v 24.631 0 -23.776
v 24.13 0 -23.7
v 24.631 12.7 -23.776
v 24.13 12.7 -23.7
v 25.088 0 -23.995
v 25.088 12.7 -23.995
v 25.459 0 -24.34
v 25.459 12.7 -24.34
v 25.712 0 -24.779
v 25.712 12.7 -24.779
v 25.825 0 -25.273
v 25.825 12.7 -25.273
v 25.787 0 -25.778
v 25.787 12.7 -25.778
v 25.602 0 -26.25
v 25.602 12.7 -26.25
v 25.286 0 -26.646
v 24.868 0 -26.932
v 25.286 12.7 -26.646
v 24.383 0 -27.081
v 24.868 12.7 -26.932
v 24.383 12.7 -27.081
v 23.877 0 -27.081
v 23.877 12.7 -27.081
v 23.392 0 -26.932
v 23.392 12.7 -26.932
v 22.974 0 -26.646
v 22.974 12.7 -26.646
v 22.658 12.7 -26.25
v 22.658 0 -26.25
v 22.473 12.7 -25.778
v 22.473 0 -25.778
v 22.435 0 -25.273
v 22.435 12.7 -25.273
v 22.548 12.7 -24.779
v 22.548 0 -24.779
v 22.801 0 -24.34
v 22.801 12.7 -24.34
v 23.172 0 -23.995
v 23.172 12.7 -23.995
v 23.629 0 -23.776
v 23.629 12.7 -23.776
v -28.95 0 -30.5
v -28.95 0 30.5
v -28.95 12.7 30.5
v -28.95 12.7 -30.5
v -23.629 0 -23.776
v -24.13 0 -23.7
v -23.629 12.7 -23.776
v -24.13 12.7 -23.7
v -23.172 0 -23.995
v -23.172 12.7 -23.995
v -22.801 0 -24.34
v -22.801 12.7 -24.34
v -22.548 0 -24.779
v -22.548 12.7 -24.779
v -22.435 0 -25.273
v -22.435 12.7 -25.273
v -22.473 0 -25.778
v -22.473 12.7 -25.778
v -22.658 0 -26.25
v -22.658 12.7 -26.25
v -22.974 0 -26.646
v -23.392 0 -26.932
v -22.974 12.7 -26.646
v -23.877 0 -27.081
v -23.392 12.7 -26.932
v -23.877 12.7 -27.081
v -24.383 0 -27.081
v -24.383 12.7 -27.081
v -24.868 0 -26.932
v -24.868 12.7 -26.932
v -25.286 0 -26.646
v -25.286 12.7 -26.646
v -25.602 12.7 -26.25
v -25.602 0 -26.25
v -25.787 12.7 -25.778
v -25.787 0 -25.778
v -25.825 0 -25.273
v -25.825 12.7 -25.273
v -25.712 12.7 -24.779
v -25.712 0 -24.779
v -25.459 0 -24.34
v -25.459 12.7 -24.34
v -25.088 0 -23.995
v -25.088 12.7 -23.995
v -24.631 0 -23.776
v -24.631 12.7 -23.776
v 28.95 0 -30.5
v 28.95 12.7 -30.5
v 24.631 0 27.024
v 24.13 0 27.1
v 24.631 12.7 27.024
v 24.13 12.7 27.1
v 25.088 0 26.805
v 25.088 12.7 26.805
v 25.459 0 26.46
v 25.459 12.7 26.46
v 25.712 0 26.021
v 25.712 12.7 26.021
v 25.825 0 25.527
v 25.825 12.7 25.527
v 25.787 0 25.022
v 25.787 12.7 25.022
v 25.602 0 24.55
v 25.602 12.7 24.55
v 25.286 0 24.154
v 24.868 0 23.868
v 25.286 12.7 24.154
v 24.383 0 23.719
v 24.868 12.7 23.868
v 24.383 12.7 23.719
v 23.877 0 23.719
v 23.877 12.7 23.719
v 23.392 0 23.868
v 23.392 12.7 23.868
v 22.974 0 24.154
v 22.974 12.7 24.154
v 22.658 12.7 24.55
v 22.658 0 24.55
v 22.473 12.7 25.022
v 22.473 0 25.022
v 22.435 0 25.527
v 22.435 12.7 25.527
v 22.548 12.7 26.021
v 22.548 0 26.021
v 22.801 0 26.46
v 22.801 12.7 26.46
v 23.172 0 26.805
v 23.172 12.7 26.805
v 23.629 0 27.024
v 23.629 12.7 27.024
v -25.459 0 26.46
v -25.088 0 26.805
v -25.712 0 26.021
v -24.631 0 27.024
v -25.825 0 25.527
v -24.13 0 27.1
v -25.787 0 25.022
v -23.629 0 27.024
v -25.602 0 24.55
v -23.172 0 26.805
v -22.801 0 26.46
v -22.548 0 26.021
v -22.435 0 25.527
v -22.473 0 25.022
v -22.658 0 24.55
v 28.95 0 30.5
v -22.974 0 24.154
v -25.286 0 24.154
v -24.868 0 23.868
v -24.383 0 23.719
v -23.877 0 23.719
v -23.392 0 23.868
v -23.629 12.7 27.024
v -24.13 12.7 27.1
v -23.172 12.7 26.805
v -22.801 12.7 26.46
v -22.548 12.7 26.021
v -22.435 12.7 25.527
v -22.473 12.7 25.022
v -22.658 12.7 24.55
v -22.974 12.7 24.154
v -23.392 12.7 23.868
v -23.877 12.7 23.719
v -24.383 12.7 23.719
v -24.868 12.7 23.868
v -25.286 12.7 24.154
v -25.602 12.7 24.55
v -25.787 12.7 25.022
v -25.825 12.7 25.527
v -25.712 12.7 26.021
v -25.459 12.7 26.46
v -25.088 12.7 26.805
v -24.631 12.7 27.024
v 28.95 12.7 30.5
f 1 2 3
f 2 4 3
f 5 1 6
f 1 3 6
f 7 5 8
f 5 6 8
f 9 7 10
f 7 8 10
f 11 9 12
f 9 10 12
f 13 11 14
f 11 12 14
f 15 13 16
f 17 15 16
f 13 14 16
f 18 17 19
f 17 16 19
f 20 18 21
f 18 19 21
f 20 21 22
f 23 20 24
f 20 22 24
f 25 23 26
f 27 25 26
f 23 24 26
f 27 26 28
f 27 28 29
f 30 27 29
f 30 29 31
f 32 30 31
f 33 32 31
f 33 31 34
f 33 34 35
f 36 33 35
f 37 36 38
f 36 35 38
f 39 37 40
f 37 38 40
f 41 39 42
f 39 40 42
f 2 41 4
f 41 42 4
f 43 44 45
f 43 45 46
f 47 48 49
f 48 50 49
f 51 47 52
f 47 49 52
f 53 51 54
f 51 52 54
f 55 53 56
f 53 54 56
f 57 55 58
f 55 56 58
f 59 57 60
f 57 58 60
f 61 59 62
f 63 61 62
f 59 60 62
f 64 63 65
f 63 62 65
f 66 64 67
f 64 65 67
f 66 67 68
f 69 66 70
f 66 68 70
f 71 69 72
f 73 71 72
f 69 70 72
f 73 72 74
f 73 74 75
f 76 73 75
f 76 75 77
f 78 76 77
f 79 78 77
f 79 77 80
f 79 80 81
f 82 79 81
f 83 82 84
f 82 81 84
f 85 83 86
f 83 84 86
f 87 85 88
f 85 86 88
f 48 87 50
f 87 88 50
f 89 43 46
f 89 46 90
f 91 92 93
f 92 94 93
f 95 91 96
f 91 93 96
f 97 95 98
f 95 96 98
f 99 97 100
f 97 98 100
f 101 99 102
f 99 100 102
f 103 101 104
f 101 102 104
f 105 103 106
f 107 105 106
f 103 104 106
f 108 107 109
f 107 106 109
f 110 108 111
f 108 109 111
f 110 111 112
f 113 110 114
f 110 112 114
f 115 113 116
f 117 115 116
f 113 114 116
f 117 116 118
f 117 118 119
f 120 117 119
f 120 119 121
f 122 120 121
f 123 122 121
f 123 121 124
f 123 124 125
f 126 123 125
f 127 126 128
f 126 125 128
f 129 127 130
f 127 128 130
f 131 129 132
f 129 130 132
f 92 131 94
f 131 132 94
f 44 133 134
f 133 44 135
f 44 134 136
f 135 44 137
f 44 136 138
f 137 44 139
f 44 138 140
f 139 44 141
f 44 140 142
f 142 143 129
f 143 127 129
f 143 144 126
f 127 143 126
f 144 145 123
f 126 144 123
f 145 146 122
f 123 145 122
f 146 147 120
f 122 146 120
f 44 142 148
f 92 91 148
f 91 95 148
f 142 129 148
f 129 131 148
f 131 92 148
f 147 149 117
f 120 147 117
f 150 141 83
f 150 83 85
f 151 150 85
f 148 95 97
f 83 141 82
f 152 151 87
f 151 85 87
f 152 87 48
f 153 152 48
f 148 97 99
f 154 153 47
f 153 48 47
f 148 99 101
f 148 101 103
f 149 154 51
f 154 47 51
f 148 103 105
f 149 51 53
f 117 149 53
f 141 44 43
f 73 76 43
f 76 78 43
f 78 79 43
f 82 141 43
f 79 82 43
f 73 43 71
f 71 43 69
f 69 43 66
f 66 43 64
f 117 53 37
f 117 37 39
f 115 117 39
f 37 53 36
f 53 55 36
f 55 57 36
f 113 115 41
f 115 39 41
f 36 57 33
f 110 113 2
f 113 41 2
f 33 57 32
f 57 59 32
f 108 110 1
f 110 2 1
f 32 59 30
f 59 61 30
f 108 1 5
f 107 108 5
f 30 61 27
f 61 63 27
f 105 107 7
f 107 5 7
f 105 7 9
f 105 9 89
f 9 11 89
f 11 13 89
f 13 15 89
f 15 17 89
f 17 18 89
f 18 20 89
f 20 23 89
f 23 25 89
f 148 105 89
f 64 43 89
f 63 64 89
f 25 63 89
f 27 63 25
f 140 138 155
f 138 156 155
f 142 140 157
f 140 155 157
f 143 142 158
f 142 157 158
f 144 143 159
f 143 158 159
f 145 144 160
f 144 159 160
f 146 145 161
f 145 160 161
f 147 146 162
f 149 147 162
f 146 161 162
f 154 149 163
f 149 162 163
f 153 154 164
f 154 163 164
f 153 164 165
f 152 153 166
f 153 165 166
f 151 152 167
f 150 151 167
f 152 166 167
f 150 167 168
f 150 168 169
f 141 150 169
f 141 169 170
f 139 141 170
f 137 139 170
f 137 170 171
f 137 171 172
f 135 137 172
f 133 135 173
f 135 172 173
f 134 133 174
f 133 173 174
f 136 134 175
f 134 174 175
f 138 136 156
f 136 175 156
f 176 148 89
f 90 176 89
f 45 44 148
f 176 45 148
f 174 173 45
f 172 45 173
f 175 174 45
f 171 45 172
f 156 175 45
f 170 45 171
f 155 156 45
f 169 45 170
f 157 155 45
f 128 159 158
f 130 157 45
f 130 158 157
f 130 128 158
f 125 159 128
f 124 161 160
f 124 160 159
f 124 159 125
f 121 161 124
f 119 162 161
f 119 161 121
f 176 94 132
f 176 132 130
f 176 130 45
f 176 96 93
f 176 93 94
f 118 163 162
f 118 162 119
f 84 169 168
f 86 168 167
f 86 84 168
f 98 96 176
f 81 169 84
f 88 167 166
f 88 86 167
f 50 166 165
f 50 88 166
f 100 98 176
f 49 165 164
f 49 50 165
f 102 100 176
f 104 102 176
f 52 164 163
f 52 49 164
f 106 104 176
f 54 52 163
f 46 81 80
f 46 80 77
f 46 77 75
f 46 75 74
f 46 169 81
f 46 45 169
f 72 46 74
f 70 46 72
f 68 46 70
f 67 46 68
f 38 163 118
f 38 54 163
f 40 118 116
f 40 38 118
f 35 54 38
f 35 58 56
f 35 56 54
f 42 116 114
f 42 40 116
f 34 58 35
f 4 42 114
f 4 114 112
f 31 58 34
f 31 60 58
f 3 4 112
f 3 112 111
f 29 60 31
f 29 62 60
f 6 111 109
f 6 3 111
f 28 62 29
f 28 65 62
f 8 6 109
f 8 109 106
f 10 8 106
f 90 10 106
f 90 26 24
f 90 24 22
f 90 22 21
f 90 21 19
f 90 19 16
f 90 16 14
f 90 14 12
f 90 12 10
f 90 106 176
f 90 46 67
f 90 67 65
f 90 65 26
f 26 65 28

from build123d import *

# Parameters (mm, degrees)
SKETCH1_W                = 57.9
SKETCH1_H                = 61
EXTRUDE1_DEPTH           = 12.7
M3_CLEARANCE_HOLE1_D     = 3.4
M3_CLEARANCE_HOLE1_DEPTH = 12.7
M3_CLEARANCE_HOLE1_TIP   = 1.021463052


with BuildPart() as part:
    # Sketch1 → Extrude1 (new body)
    with BuildSketch(Plane(origin=(0, 0, 0), x_dir=(1, 0, 0), z_dir=(0, 1, 0))):
        Rectangle(SKETCH1_W, SKETCH1_H)
    extrude(amount=EXTRUDE1_DEPTH)

    # M3 Clearance Hole1
    with Locations(Plane(origin=(24.13, 0, -25.4), x_dir=(0, 0, -1), z_dir=(0, -1, 0))):
        with Locations((0, 0), (0, -48.26), (-50.8, -48.26), (-50.8, 0)):
            Hole(M3_CLEARANCE_HOLE1_D / 2, depth=M3_CLEARANCE_HOLE1_DEPTH)
            with Locations((0, 0, -(M3_CLEARANCE_HOLE1_DEPTH + M3_CLEARANCE_HOLE1_TIP / 2))):  # 118° drill point
                Cone(0, M3_CLEARANCE_HOLE1_D / 2, M3_CLEARANCE_HOLE1_TIP, mode=Mode.SUBTRACT)


solid = part.part
